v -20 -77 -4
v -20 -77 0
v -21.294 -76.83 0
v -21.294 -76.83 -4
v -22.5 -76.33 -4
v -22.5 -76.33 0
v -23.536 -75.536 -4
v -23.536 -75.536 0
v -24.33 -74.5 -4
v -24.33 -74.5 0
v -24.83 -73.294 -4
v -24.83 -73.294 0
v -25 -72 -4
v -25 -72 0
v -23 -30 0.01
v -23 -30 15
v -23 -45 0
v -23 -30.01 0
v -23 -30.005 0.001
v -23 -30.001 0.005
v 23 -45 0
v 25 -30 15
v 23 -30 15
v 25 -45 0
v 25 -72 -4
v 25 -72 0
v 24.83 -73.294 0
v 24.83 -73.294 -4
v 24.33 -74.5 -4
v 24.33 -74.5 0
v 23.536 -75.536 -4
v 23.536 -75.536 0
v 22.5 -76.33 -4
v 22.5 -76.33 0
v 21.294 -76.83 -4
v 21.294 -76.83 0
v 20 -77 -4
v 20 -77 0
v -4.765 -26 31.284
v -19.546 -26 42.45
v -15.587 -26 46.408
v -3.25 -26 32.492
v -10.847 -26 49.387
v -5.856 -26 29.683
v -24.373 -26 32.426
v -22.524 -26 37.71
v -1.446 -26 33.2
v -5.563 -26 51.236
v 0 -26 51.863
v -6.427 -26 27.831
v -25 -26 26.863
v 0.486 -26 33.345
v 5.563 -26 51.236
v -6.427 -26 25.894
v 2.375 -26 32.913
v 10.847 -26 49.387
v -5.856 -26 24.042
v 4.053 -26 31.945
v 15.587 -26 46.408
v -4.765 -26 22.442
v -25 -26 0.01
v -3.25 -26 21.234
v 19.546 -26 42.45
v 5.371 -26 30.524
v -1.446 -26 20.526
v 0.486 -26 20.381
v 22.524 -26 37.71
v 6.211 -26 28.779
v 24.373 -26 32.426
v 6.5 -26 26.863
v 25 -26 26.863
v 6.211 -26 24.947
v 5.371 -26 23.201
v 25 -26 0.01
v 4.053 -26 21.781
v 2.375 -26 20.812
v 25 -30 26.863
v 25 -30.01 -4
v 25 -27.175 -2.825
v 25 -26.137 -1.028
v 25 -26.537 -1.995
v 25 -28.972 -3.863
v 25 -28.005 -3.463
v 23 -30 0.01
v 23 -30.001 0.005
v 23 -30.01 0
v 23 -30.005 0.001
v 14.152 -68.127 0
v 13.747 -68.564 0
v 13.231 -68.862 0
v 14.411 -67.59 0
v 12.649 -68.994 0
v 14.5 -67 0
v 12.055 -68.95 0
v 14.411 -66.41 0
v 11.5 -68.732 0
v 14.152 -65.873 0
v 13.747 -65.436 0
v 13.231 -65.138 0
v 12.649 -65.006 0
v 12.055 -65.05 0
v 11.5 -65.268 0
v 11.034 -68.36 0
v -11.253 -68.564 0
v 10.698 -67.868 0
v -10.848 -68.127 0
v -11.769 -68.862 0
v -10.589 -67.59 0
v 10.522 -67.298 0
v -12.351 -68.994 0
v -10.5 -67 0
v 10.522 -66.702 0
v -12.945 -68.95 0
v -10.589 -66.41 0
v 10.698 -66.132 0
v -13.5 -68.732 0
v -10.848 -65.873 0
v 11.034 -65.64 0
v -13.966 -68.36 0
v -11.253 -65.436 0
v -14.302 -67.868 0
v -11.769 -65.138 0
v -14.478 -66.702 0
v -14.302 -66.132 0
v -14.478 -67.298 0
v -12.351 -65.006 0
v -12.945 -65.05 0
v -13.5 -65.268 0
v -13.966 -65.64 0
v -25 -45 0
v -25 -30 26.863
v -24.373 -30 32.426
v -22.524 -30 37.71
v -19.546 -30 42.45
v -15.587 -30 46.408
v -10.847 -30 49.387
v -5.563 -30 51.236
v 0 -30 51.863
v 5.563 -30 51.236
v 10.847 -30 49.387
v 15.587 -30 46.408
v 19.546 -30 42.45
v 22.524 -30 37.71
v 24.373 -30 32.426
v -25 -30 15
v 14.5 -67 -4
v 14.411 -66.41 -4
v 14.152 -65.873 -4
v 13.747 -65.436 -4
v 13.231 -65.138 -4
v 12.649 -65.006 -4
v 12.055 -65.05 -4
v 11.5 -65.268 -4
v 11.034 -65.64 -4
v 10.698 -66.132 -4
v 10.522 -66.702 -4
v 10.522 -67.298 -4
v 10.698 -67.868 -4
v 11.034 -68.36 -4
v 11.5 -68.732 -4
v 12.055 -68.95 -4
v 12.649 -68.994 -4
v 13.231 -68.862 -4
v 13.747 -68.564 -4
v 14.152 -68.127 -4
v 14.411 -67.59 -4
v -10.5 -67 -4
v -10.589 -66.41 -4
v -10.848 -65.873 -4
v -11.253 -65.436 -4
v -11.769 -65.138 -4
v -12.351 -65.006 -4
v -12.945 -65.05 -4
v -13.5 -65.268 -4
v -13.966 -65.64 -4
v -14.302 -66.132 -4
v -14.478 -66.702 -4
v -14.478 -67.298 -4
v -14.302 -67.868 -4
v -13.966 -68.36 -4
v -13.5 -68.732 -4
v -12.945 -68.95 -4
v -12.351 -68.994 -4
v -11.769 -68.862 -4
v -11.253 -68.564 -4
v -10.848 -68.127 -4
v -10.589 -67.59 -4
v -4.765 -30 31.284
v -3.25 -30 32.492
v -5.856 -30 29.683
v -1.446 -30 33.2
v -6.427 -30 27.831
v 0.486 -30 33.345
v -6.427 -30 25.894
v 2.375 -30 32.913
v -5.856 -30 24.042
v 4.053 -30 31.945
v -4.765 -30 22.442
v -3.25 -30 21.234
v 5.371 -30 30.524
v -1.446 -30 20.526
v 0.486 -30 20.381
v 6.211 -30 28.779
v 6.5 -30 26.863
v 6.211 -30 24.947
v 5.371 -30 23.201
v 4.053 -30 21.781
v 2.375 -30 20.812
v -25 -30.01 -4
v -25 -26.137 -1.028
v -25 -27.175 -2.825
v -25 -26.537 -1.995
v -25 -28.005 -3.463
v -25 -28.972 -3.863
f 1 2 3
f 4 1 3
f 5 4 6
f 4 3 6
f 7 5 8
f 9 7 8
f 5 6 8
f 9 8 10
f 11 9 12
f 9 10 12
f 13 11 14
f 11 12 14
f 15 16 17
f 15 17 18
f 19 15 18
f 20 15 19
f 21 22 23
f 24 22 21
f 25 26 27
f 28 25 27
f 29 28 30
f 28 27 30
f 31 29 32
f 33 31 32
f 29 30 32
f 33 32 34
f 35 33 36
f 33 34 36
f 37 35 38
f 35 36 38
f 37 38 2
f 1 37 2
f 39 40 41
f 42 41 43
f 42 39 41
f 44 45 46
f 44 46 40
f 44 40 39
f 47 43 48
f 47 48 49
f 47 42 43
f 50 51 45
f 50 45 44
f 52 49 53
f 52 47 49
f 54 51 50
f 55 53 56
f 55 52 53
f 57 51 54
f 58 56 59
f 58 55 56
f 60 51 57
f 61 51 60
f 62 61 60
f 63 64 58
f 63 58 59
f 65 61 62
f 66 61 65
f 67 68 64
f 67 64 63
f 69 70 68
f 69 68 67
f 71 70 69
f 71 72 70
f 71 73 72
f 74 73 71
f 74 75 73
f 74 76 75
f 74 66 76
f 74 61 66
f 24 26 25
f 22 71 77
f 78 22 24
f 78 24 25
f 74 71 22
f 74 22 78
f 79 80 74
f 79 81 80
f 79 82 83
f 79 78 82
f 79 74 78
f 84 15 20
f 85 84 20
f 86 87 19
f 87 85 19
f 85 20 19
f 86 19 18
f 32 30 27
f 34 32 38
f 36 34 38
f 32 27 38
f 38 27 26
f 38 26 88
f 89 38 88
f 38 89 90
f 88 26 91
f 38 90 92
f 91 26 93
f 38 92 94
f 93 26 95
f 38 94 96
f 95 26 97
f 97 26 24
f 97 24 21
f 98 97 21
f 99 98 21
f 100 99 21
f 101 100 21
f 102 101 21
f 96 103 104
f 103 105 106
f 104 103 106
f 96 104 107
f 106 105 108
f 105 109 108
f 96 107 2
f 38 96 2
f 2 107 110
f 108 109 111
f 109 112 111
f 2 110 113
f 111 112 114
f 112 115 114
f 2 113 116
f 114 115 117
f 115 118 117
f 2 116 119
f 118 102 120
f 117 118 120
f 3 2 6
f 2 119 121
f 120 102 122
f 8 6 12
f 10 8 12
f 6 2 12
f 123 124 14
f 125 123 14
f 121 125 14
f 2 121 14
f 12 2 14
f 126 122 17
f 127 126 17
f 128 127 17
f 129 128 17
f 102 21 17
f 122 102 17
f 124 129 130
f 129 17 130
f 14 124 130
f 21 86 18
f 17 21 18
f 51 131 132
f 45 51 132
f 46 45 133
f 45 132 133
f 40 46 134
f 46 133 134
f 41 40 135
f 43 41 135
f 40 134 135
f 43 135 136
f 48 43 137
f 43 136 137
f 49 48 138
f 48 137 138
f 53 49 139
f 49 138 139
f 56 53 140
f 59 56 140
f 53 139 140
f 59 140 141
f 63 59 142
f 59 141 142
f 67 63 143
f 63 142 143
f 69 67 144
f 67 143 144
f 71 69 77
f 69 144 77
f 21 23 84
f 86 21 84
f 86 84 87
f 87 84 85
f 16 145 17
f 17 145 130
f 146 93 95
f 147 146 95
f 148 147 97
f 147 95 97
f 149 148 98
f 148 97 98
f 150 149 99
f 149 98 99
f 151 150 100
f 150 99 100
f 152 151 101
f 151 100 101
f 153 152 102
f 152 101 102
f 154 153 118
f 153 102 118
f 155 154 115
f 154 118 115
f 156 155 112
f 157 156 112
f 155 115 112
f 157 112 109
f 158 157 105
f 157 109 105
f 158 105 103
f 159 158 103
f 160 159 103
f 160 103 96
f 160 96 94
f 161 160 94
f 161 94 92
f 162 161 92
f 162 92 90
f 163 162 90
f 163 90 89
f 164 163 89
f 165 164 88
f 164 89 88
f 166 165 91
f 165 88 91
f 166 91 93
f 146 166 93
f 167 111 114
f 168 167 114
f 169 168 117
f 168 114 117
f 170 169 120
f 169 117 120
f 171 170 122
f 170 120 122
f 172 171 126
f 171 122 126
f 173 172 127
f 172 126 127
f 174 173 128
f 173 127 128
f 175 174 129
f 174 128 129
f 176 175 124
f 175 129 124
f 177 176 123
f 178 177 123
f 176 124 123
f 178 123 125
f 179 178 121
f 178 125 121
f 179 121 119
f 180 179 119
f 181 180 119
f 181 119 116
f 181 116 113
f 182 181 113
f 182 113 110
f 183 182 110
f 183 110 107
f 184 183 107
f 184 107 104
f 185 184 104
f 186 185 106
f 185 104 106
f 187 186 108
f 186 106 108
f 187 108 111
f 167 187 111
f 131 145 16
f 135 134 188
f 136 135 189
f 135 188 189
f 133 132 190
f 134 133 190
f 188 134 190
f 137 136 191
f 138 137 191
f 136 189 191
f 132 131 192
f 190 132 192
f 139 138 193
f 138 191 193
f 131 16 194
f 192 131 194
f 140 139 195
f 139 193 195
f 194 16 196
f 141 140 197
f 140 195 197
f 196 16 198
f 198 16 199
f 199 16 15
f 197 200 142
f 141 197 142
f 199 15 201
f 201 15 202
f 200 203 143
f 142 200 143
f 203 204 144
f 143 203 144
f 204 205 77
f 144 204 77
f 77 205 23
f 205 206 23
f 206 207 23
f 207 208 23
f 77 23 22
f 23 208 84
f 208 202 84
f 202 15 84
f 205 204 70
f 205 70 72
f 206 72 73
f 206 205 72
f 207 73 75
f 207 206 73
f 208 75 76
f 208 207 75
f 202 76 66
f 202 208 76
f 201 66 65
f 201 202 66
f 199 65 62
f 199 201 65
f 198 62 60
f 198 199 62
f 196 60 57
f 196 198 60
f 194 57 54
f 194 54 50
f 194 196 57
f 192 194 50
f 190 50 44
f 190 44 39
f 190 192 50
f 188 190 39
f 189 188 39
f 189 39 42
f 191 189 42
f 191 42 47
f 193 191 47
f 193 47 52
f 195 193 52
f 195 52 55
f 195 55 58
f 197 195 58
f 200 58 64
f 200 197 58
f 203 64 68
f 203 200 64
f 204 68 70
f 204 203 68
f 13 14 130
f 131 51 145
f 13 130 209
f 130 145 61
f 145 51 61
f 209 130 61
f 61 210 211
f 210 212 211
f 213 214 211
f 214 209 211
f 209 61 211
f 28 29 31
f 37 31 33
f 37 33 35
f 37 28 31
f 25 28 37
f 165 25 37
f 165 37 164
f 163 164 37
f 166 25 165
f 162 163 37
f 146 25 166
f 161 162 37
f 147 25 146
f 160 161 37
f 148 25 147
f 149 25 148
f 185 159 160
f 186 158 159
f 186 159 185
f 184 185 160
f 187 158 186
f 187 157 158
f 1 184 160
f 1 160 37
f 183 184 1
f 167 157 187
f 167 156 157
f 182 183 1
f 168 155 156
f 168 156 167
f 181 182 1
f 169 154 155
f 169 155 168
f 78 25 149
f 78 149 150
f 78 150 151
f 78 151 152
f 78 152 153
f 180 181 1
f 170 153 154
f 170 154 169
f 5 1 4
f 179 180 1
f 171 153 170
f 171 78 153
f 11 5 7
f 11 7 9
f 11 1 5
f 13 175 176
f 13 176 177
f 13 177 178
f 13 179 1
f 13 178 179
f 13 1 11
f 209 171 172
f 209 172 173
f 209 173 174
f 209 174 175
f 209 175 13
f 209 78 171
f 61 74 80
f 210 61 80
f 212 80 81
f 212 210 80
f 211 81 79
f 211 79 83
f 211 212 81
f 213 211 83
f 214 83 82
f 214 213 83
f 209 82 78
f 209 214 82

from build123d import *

# Parameters (mm, degrees)
SCHIZZO1_R                           = 6.5
SCHIZZO1_R_2                         = 2
BASE_FLANGIA1_DEPTH                  = 4
PIEGATURA_START                      = -26
PIEGATURA_DELLO_SCHIZZO1_OUTLINE_W   = 50
PIEGATURA_DELLO_SCHIZZO1_OUTLINE_H   = 4
PIEGATURA_DELLO_SCHIZZO1_DEPTH       = 52
PIEGATURA_START_2                    = -30
PIEGATURA_DELLO_SCHIZZO1_2_OUTLINE_R = 6.5
PIEGATURA_DELLO_SCHIZZO1_2_DEPTH     = 4
PIEGATURA_DELLO_SCHIZZO1_3_DEPTH     = 52
PIEGATURA_START_3                    = -25
PIEGATURA_DELLO_SCHIZZO1_4_DEPTH     = 50
ESTRUSIONE_ESTRUSIONE1_DEPTH         = 2


with BuildPart() as part:
    # Base-Flangia1: sheet metal written as solids
    # Schizzo1 → Base-Flangia1 (new body)
    with BuildSketch(Plane.XY):
        with BuildLine():
            Line((-25, -72), (-25, 0))
            ThreePointArc((-25, 0), (0, 25), (25, 0))
            Line((25, 0), (25, -72))
            ThreePointArc((25, -72), (23.535533906, -75.535533906), (20, -77))
            Line((20, -77), (-20, -77))
            ThreePointArc((-20, -77), (-23.535533906, -75.535533906), (-25, -72))
        make_face()
        Circle(SCHIZZO1_R, mode=Mode.SUBTRACT)
        with Locations((-12.5, -67)):
            Circle(SCHIZZO1_R_2, mode=Mode.SUBTRACT)
        with Locations((12.5, -67)):
            Circle(SCHIZZO1_R_2, mode=Mode.SUBTRACT)
    extrude(amount=-BASE_FLANGIA1_DEPTH)

    # Piegatura dello schizzo1: read off the stored shape, not the designer's step
    # Piegatura dello schizzo1 outline → Piegatura dello schizzo1 (cut)
    with BuildSketch(Plane(origin=(0, 0, 0), x_dir=(1, 0, 0), z_dir=(0, 1, 0)).offset(PIEGATURA_START)):
        with Locations((0, 2)):
            Rectangle(PIEGATURA_DELLO_SCHIZZO1_OUTLINE_W, PIEGATURA_DELLO_SCHIZZO1_OUTLINE_H)
    extrude(amount=PIEGATURA_DELLO_SCHIZZO1_DEPTH, mode=Mode.SUBTRACT)

    # Piegatura dello schizzo1 2 outline → Piegatura dello schizzo1 2 (add)
    with BuildSketch(Plane(origin=(0, 0, 0), x_dir=(1, 0, 0), z_dir=(0, 1, 0)).offset(PIEGATURA_START_2)):
        with BuildLine():
            Line((-25, 0), (-25, -26.862699383))
            ThreePointArc((-25, -26.862699383), (0, -51.862699383), (25, -26.862699383))
            Line((25, -26.862699383), (25, 0))
            Line((25, 0), (-25, 0))
        make_face()
        with Locations((0, -26.862699383)):
            Circle(PIEGATURA_DELLO_SCHIZZO1_2_OUTLINE_R, mode=Mode.SUBTRACT)
    extrude(amount=PIEGATURA_DELLO_SCHIZZO1_2_DEPTH)

    # Piegatura dello schizzo1 3 outline → Piegatura dello schizzo1 3 (cut)
    with BuildSketch(Plane.YZ.offset(PIEGATURA_START)):
        with BuildLine():
            ThreePointArc((-26, 0.01), (-27.174501807, -2.825498193), (-30.01, -4))
            Line((-30.01, -4), (-26, -4))
            Line((-26, -4), (-26, 0.01))
        make_face()
    extrude(amount=PIEGATURA_DELLO_SCHIZZO1_3_DEPTH, mode=Mode.SUBTRACT)

    # Piegatura dello schizzo1 4 outline → Piegatura dello schizzo1 4 (add)
    with BuildSketch(Plane.YZ.offset(PIEGATURA_START_3)):
        with BuildLine():
            ThreePointArc((-30, 0.01), (-30.002928932, 0.002928932), (-30.01, 0))
            Line((-30.01, 0), (-30, 0))
            Line((-30, 0), (-30, 0.01))
        make_face()
    extrude(amount=PIEGATURA_DELLO_SCHIZZO1_4_DEPTH)

    # Schizzo13 → Estrusione-Estrusione1 (add)
    with BuildSketch(Plane.ZY.offset(25)):
        with BuildLine():
            Line((0.01, -30), (15, -30))
            Line((15, -30), (0, -45))
            Line((0, -45), (0, -30.01))
            ThreePointArc((0, -30.01), (0.002928932, -30.002928932), (0.01, -30))
        make_face()
    estrusione_estrusione1 = extrude(amount=-ESTRUSIONE_ESTRUSIONE1_DEPTH)

    # Specchia1: Estrusione-Estrusione1 across plane
    add(estrusione_estrusione1.mirror(Plane(origin=(0, 0, 0), x_dir=(0, 0, 1), z_dir=(1, 0, 0))))


solid = part.part
